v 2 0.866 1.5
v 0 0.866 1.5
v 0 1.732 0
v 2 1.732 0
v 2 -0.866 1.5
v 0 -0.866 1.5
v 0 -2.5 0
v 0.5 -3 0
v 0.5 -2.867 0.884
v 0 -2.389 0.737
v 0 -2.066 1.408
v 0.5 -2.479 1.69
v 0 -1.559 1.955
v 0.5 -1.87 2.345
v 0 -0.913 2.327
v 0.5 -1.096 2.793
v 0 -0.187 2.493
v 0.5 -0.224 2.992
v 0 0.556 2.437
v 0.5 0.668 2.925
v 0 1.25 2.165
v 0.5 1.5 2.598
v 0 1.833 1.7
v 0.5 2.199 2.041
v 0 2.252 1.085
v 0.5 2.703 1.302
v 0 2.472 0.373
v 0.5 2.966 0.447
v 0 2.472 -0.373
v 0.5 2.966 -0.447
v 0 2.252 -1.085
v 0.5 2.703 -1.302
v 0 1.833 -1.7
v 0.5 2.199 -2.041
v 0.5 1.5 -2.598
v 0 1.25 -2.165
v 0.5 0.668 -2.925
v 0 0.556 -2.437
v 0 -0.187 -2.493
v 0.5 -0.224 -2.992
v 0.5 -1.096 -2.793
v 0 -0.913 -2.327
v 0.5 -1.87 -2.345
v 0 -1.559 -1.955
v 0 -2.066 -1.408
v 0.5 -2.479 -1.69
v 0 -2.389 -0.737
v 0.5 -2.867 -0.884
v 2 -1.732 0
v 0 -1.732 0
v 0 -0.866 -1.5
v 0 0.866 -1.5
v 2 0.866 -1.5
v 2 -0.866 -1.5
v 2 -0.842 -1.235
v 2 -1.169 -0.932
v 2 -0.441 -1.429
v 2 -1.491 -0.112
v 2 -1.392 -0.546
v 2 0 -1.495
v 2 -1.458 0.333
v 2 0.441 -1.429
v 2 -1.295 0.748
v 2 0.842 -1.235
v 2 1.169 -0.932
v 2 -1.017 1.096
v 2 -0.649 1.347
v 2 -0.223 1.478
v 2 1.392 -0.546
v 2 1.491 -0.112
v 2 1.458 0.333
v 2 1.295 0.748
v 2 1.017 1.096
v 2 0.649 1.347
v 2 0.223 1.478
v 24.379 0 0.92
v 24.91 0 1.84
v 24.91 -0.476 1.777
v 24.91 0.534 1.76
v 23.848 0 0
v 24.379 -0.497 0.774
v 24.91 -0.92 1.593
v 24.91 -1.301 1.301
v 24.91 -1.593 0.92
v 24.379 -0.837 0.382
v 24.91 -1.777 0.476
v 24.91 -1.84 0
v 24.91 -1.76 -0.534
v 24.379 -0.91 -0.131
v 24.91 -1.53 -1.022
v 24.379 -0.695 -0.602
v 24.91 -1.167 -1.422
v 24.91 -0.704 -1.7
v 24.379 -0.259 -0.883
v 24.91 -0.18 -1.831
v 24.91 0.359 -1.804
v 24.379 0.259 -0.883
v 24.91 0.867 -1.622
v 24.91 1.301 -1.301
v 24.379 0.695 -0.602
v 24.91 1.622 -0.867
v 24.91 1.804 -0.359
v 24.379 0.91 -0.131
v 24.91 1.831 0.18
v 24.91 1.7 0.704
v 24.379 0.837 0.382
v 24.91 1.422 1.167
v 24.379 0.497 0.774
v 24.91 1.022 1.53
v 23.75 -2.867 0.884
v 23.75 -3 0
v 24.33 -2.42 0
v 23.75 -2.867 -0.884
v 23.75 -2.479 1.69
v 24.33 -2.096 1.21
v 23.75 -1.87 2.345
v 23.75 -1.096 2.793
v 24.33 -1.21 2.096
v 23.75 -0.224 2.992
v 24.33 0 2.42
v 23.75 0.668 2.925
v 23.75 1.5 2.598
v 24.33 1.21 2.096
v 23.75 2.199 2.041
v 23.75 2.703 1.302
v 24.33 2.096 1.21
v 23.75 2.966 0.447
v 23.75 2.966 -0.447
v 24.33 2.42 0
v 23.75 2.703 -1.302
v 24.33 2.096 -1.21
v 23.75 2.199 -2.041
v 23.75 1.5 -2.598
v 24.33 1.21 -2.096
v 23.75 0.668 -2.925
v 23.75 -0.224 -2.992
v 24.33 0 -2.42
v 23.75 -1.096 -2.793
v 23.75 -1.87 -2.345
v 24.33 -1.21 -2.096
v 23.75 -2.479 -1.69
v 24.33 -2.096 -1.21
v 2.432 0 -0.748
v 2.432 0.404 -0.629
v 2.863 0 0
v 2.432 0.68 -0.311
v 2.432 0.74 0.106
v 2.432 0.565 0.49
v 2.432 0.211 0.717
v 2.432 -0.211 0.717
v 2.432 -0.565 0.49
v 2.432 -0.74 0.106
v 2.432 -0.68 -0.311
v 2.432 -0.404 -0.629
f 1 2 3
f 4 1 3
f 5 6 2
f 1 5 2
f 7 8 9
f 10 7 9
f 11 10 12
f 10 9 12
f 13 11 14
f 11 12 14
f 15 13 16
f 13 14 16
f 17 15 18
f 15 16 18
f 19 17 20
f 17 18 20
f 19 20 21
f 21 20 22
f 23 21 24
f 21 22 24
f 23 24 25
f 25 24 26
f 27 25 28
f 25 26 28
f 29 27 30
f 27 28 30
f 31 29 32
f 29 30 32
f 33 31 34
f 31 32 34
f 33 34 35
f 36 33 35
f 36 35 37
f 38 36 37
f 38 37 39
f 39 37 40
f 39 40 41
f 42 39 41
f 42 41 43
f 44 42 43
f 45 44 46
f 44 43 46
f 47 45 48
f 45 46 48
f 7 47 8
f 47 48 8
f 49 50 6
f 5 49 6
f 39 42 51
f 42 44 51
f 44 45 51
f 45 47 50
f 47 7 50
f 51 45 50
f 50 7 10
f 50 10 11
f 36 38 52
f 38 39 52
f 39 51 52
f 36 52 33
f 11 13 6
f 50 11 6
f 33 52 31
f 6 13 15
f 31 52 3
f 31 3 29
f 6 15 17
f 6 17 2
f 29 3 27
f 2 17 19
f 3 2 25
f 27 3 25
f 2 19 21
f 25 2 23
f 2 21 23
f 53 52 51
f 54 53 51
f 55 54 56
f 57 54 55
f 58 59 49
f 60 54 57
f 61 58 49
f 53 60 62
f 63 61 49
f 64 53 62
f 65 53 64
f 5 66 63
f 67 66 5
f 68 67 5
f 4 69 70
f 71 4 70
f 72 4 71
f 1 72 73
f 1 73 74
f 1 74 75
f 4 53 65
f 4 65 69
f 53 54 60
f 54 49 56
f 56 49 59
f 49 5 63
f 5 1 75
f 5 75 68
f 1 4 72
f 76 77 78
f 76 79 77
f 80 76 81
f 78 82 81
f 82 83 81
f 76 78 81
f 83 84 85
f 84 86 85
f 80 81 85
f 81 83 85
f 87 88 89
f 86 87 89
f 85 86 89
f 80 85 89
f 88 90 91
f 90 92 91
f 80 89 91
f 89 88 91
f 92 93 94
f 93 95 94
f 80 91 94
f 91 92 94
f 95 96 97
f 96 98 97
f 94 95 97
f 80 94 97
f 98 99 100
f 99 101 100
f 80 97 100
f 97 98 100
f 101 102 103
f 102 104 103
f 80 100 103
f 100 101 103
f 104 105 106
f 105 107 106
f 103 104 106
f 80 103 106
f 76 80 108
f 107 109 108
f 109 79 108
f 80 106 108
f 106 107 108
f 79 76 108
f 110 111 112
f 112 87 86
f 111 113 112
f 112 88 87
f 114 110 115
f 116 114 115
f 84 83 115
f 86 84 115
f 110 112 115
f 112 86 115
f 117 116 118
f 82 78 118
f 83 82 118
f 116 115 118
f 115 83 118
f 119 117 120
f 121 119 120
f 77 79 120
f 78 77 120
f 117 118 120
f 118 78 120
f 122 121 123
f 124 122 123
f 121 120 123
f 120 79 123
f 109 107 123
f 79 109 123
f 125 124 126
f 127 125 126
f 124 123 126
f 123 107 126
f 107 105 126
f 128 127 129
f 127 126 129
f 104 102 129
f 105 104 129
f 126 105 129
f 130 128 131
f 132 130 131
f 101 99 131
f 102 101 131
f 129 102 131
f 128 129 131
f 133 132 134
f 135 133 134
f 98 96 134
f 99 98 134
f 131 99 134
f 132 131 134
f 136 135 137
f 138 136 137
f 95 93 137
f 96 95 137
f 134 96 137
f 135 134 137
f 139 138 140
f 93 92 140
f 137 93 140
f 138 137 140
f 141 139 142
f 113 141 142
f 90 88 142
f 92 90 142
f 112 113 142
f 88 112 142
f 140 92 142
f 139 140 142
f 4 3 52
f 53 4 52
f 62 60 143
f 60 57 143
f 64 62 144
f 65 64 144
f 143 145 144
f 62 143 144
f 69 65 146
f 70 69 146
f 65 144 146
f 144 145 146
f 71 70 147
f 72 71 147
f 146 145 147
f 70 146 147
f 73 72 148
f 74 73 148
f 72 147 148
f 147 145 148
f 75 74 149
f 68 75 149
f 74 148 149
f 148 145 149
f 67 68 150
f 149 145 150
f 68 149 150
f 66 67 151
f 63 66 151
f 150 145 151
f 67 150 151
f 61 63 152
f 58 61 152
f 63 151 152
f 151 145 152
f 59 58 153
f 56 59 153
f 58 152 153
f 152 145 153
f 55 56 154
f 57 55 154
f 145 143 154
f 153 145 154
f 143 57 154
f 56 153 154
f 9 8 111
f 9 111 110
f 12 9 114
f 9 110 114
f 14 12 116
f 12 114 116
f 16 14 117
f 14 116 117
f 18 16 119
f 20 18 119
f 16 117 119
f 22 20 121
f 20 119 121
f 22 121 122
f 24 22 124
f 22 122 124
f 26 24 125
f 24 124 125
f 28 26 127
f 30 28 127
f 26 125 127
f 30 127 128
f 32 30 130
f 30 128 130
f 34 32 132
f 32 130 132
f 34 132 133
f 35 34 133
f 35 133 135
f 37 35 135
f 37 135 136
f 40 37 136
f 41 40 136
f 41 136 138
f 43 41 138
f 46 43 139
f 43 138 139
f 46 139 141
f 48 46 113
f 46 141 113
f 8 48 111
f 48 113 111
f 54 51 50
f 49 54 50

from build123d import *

# Parameters (mm, degrees)
SKETCH1_W          = 25
SKETCH1_H          = 3
CUT_EXTRUDE1_DEPTH = 2
CHAMFER1_SIZE      = 0.5
CHAMFER2_SIZE      = 1.25


with BuildPart() as part:
    # Sketch1 → Revolve1 (revolve)
    with BuildSketch(Plane.XY, mode=Mode.PRIVATE) as revolve1_sk:
        with Locations((12.5, 1.5)):
            Rectangle(SKETCH1_W, SKETCH1_H)
    revolve(revolve1_sk.sketch.rotate(Axis((25, 0, 0), (-1, 0, 0)), 180), axis=Axis((25, 0, 0), (-1, 0, 0)))

    # Sketch2 → Cut-Revolve1 (revolve, cut)
    with BuildSketch(Plane.XY, mode=Mode.PRIVATE) as cut_revolve1_sk:
        Polygon((2, 1.495), (2.863138652, 0), (0, 0), (0, 1.495), align=None)
    revolve(cut_revolve1_sk.sketch.rotate(Axis((-1.178327448, 0, 0), (1, 0, 0)), 270), axis=Axis((-1.178327448, 0, 0), (1, 0, 0)), mode=Mode.SUBTRACT)

    # Sketch3 → Cut-Extrude1 (cut)
    with BuildSketch(Plane.ZY):
        Polygon((0, 1.732050808), (-1.5, 0.866025404), (-1.5, -0.866025404), (0, -1.732050808), (1.5, -0.866025404), (1.5, 0.866025404), align=None)
    extrude(amount=-CUT_EXTRUDE1_DEPTH, mode=Mode.SUBTRACT)

    # Sketch4 → Cut-Revolve2 (revolve, cut)
    with BuildSketch(Plane.XY, mode=Mode.PRIVATE) as cut_revolve2_sk:
        Polygon((25, 1.995), (25, 0), (23.848186213, 0), align=None)
    revolve(cut_revolve2_sk.sketch.rotate(Axis((-1.256465595, 0, 0), (1, 0, 0)), 90), axis=Axis((-1.256465595, 0, 0), (1, 0, 0)), mode=Mode.SUBTRACT)

    # Chamfer1
    chamfer1_edges = [part.edges().sort_by_distance(p)[0] for p in [
        (0, 3, 0),
    ]]
    chamfer(chamfer1_edges, length=CHAMFER1_SIZE)

    # Chamfer2
    # the kernel refuses this chamfer: 1.25 mm, written as the material it takes off along each edge
    with BuildSketch(Plane(origin=(25, 0, 0), x_dir=(0, -1, 0), z_dir=(0, 0, -1))) as chamfer2_piece_1:
        Polygon((3, CHAMFER2_SIZE), (3 - CHAMFER2_SIZE, 0), (3, 0), align=None)
    revolve(axis=Axis((25, 0, 0), (-1, 0, 0)), mode=Mode.SUBTRACT)


solid = part.part
